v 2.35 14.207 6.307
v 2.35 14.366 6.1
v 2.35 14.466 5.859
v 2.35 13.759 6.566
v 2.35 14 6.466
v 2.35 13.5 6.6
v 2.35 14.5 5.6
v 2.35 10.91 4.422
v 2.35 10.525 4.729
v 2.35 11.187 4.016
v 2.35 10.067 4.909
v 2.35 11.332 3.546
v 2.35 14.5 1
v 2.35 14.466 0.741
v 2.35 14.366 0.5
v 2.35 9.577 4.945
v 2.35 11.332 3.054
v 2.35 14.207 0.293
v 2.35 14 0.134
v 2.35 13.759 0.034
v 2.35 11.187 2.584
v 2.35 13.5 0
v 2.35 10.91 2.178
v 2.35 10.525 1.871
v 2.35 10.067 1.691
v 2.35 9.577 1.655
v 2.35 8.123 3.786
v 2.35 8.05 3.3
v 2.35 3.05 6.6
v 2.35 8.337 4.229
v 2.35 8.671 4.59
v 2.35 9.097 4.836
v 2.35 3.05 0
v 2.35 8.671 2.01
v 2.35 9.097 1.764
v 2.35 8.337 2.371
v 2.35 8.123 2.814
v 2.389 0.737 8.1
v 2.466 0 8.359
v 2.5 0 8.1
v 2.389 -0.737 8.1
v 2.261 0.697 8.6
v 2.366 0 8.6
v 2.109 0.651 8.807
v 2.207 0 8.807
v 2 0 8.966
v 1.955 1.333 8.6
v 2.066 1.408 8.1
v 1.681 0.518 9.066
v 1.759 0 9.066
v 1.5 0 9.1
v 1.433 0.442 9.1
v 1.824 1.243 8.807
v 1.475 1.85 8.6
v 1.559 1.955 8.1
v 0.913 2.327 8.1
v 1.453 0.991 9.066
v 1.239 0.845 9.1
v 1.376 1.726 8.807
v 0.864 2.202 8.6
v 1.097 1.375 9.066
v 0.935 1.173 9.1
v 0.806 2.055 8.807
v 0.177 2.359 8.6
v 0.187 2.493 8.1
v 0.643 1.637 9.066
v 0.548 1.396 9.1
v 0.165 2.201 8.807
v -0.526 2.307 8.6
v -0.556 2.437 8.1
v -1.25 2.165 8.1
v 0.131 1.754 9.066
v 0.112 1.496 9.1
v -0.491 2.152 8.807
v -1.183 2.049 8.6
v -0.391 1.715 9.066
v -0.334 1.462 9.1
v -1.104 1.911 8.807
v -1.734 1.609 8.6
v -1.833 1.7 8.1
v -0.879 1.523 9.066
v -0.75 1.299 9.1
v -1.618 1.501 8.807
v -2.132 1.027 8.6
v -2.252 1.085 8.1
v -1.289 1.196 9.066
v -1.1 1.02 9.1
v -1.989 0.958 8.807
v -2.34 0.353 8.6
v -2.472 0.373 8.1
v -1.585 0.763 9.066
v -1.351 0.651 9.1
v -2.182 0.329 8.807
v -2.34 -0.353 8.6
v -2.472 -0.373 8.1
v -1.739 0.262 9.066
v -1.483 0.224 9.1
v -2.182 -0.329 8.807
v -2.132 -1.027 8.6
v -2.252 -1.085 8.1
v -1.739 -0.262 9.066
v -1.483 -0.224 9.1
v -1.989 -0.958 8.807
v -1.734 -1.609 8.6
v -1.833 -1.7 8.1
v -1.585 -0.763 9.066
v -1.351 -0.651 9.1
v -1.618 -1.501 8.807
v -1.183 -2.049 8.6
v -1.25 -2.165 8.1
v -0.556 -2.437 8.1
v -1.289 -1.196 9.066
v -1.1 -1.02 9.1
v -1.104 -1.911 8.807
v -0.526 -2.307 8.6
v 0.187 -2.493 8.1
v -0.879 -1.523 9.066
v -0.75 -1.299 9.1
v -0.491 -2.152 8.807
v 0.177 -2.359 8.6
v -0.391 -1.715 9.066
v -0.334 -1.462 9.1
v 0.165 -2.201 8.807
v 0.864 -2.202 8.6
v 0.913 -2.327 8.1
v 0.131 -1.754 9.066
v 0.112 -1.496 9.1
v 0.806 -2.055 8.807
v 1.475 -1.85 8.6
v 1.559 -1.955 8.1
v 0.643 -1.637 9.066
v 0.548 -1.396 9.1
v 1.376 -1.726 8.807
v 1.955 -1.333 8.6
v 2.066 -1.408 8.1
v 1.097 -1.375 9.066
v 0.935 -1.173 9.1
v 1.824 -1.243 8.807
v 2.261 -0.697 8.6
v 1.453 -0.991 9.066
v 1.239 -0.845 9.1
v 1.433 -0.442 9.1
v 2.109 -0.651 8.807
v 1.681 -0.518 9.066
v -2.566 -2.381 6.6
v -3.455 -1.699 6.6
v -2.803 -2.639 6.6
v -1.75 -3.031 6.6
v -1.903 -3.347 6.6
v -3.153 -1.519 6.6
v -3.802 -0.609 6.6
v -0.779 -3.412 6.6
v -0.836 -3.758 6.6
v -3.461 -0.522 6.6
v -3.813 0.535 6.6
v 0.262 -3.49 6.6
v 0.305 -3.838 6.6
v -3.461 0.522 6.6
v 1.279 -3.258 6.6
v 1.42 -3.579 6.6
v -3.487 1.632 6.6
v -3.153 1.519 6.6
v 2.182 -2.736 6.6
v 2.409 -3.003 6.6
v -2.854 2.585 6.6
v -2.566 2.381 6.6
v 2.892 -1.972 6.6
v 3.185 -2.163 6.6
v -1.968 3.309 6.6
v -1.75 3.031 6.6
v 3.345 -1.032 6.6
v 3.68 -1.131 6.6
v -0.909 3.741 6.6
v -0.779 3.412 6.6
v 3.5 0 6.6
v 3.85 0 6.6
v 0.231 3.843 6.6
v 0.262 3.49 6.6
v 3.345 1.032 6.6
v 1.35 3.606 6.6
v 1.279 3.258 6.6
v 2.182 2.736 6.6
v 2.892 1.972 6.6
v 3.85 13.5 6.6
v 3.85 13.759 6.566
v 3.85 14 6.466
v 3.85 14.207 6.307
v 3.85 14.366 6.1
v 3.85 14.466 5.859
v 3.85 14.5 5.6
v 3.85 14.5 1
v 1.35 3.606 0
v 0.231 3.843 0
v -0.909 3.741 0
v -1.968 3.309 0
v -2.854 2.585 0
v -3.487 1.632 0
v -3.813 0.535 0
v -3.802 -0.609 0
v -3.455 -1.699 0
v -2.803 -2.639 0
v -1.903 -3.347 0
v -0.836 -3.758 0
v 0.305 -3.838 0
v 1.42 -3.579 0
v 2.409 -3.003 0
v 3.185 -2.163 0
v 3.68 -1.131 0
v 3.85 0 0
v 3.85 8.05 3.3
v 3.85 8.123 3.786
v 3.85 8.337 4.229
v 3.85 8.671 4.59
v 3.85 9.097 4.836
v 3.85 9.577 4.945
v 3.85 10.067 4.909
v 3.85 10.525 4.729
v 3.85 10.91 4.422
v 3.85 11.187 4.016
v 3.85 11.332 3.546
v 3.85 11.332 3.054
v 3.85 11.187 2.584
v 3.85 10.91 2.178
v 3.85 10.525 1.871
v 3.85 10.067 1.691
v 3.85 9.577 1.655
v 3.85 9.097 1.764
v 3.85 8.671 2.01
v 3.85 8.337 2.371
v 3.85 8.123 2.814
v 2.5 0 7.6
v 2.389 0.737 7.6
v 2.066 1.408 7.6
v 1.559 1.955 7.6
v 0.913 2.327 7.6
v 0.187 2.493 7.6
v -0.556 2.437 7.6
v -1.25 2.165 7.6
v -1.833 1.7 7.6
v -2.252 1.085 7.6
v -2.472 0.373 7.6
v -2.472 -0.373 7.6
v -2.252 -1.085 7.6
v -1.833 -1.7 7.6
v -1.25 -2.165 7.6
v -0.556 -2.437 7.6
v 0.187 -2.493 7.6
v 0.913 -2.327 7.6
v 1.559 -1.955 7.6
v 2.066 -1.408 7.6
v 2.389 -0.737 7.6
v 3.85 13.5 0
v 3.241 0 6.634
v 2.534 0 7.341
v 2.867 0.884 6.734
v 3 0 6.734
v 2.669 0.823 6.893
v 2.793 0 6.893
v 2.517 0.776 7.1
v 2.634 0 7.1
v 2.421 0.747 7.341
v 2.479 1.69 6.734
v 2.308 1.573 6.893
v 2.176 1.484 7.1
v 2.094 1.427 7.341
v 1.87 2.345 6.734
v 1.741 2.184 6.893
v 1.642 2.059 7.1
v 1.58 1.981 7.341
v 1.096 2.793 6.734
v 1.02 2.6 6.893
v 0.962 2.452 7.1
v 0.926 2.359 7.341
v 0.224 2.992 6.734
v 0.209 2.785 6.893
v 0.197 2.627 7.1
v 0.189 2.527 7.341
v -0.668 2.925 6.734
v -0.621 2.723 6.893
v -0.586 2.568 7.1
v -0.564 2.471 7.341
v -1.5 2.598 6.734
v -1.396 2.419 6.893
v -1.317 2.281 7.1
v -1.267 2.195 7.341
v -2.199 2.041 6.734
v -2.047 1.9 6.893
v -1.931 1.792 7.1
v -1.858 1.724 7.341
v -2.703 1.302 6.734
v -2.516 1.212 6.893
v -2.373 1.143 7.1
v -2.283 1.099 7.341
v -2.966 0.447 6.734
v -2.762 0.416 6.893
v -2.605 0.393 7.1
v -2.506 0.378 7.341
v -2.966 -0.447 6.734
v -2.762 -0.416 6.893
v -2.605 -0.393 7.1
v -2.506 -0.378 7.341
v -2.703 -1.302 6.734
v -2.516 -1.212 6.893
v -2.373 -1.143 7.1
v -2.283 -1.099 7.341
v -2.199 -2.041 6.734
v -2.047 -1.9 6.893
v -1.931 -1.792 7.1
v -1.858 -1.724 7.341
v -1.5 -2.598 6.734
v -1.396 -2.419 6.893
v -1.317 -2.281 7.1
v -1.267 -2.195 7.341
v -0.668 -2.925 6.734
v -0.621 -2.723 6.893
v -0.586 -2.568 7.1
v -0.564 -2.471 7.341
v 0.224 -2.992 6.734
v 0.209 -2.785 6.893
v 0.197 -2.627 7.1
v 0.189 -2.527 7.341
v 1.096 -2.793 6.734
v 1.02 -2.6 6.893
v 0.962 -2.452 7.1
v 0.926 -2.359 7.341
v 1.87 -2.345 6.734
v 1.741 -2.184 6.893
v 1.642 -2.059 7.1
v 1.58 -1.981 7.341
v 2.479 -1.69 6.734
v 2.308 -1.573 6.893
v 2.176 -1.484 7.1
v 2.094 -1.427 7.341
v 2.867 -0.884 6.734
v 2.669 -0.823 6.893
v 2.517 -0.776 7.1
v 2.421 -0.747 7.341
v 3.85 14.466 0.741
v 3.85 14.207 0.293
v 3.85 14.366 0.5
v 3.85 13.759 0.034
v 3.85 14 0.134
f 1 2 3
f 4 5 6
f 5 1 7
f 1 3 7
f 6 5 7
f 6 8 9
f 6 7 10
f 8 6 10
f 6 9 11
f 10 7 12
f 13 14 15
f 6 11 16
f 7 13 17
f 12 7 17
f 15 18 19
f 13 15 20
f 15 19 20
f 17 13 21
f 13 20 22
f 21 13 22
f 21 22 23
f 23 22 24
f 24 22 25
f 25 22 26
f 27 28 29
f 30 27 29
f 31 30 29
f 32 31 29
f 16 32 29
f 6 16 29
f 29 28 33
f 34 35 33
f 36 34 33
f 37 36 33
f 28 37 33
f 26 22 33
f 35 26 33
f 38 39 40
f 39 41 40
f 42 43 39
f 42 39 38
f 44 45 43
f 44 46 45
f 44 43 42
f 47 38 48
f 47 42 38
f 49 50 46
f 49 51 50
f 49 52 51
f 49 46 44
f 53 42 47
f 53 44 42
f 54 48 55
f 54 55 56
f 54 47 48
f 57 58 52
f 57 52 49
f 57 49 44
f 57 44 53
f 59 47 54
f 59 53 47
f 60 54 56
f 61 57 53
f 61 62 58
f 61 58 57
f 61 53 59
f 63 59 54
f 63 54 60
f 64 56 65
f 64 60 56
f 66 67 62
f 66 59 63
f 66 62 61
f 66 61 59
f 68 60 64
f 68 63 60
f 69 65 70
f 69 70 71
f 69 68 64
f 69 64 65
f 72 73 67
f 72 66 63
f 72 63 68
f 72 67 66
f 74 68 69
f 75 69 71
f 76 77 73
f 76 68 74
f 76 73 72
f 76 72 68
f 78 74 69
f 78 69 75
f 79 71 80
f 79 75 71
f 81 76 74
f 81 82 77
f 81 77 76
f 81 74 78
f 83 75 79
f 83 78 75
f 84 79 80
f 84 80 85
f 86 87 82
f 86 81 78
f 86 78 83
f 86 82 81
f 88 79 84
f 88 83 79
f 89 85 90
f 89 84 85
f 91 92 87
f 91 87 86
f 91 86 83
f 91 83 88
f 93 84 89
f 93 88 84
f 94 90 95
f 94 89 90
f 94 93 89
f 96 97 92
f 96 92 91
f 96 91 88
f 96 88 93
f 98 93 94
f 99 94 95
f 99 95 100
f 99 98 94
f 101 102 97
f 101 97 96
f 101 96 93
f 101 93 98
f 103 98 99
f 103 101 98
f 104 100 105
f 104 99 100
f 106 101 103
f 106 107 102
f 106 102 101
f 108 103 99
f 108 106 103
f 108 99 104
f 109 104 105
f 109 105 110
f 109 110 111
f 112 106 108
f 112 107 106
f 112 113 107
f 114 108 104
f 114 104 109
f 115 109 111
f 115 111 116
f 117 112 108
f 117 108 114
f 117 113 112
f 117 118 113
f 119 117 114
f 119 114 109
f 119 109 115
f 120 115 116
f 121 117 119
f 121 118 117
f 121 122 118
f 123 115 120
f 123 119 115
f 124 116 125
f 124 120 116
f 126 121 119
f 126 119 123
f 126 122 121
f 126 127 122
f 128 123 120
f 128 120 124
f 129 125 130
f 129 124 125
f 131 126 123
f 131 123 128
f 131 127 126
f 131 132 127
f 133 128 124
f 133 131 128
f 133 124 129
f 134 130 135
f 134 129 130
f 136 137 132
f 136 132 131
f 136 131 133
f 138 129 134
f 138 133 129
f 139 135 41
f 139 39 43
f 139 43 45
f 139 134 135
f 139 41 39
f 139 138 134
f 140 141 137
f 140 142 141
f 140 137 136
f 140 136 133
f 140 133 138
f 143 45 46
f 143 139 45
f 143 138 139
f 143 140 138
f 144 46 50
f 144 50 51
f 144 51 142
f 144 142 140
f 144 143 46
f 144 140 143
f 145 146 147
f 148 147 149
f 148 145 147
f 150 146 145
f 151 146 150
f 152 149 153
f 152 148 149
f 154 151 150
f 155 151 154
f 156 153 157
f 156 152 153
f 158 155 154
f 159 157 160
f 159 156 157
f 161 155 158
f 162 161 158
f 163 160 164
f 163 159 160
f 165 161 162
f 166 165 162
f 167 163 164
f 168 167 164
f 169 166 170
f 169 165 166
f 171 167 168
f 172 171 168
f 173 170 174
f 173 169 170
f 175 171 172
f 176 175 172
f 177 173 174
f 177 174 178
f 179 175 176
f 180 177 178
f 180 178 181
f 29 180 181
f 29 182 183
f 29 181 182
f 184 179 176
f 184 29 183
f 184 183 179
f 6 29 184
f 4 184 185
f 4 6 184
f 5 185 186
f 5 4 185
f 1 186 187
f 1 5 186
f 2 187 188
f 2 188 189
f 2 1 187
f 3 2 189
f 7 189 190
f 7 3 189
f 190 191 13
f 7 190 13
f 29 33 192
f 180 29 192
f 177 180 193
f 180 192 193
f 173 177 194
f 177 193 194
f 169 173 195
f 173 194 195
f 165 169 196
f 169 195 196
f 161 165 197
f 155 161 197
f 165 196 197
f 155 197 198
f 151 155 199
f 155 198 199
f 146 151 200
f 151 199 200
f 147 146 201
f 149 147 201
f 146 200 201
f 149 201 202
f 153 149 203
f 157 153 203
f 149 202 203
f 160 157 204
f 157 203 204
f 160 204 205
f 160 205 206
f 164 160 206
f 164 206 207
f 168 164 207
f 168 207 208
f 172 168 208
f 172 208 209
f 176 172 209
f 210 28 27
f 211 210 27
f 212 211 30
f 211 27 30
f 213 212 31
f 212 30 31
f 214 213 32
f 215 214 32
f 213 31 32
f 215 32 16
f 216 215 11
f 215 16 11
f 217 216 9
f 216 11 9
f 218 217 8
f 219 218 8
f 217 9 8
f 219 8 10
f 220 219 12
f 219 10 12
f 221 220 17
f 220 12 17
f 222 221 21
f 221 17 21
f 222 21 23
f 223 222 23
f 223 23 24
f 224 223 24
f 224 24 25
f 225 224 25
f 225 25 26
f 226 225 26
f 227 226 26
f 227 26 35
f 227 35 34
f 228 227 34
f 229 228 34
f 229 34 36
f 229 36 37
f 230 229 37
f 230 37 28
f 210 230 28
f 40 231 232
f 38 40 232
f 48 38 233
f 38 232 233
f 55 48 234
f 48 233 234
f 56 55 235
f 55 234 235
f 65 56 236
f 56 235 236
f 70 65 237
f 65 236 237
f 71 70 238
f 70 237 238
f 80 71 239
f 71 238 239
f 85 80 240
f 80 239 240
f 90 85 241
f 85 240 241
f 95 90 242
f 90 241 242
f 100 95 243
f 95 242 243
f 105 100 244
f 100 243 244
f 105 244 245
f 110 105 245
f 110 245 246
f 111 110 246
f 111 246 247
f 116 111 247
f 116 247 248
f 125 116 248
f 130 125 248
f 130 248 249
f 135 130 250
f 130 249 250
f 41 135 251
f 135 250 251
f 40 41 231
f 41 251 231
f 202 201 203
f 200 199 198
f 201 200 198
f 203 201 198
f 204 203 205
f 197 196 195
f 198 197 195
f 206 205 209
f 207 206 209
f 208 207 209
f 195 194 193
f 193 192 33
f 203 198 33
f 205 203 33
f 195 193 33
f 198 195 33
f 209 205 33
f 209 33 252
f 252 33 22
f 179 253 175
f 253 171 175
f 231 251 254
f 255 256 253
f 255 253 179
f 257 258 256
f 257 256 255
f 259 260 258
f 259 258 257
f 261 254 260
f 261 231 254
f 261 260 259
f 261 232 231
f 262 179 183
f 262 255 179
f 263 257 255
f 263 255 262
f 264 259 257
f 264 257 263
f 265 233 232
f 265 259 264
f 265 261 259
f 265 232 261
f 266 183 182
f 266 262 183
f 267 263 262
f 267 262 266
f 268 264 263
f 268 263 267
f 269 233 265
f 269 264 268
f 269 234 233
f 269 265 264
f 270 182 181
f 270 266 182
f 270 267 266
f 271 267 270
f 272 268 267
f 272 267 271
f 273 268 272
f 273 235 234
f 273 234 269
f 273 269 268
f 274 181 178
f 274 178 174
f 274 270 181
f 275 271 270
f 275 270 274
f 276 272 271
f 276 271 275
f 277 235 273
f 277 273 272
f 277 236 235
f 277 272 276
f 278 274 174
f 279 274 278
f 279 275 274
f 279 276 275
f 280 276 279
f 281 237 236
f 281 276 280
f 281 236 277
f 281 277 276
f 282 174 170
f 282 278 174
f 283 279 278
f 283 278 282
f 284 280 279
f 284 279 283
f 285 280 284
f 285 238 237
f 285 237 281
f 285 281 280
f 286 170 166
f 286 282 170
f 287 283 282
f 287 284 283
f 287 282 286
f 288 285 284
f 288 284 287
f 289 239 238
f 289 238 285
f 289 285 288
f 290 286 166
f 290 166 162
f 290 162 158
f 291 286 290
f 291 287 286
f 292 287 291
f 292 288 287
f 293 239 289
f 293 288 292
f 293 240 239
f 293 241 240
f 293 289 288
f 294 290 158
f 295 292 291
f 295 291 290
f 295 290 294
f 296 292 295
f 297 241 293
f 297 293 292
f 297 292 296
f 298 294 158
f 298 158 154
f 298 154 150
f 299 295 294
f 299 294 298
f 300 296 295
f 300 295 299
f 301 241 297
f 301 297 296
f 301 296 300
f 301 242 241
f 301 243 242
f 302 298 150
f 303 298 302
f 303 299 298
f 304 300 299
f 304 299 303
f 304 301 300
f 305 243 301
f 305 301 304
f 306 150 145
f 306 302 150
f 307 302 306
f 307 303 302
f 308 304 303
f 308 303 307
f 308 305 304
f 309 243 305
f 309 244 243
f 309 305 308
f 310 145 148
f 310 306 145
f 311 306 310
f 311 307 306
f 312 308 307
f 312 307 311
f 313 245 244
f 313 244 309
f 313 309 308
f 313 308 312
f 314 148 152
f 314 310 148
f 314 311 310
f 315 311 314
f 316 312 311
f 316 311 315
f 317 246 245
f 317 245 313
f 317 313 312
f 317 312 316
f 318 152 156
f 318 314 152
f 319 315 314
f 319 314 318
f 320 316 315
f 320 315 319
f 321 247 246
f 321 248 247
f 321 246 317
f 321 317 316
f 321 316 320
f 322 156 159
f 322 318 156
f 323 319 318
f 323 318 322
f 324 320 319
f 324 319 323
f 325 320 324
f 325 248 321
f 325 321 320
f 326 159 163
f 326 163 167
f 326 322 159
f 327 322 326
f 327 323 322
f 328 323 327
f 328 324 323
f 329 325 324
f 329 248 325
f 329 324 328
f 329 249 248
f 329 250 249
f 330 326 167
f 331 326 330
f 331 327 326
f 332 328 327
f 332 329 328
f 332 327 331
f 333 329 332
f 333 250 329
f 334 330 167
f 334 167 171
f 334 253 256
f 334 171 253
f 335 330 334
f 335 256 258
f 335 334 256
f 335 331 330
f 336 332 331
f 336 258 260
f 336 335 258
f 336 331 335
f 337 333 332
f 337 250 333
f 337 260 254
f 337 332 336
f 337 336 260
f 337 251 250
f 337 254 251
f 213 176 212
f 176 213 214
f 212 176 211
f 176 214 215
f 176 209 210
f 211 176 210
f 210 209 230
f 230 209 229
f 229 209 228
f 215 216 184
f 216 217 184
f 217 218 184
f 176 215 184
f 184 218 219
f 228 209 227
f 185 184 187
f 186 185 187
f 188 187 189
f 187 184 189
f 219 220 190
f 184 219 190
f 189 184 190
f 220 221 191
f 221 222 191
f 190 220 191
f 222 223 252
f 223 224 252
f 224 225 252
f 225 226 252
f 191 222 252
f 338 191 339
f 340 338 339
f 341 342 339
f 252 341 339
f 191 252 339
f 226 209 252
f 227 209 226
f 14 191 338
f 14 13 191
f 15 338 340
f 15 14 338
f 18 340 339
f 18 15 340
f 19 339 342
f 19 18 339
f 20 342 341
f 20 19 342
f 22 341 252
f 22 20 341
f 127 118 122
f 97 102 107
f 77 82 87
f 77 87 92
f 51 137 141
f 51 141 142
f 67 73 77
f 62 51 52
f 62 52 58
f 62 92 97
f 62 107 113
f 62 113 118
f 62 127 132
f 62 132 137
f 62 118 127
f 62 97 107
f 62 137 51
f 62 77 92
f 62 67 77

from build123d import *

# Parameters (mm, degrees)
SKETCH_1_R          = 3.85
EXTRUDE_1_DEPTH     = 6.6
EXTRUDE_START       = -6.6
EXTRUDE_2_DEPTH     = 6.6
SKETCH_3_R          = 2.5
EXTRUDE_3_DEPTH     = 2.5
FILLET_1_R          = 1
SKETCH_4_R          = 1.65
CUT_EXTRUDE_1_DEPTH = 10.6
FILLET_2_R          = 1


with BuildPart() as part:
    # 草图1 → 凸台-拉伸1 (new body)
    with BuildSketch(Plane.XY):
        Circle(SKETCH_1_R)
    extrude(amount=EXTRUDE_1_DEPTH)

    # 草图2 → 凸台-拉伸2 (add)
    with BuildSketch(Plane.XY.offset(6.6).offset(EXTRUDE_START)):
        with BuildLine():
            Line((3.85, 0), (3.85, 14.5))
            Line((3.85, 14.5), (2.35, 14.5))
            Line((2.35, 14.5), (2.35, 3.049590136))
            ThreePointArc((2.35, 3.049590136), (3.454706934, 1.699264547), (3.85, 0))
        make_face()
    extrude(amount=EXTRUDE_2_DEPTH)

    # 草图3 → 凸台-拉伸3 (add)
    with BuildSketch(Plane.XY.offset(6.6)):
        Circle(SKETCH_3_R)
    extrude(amount=EXTRUDE_3_DEPTH)

    # 圆角1
    fillet_1_edges = [part.edges().sort_by_distance(p)[0] for p in [
        (-2.5, 0, 6.6),
        (-2.5, 0, 9.1),
    ]]
    fillet(fillet_1_edges, radius=FILLET_1_R)

    # 草图4 → 切除-拉伸1 (cut)
    with BuildSketch(Plane.ZY.offset(-2.35)):
        with Locations(Location((3.3, 9.7, 0), (0, 0, 270))):
            Circle(SKETCH_4_R)
    extrude(amount=-CUT_EXTRUDE_1_DEPTH, mode=Mode.SUBTRACT)

    # 圆角2
    fillet_2_edges = [part.edges().sort_by_distance(p)[0] for p in [
        (3.1, 14.5, 6.6),
        (3.1, 14.5, 0),
    ]]
    fillet(fillet_2_edges, radius=FILLET_2_R)


solid = part.part
